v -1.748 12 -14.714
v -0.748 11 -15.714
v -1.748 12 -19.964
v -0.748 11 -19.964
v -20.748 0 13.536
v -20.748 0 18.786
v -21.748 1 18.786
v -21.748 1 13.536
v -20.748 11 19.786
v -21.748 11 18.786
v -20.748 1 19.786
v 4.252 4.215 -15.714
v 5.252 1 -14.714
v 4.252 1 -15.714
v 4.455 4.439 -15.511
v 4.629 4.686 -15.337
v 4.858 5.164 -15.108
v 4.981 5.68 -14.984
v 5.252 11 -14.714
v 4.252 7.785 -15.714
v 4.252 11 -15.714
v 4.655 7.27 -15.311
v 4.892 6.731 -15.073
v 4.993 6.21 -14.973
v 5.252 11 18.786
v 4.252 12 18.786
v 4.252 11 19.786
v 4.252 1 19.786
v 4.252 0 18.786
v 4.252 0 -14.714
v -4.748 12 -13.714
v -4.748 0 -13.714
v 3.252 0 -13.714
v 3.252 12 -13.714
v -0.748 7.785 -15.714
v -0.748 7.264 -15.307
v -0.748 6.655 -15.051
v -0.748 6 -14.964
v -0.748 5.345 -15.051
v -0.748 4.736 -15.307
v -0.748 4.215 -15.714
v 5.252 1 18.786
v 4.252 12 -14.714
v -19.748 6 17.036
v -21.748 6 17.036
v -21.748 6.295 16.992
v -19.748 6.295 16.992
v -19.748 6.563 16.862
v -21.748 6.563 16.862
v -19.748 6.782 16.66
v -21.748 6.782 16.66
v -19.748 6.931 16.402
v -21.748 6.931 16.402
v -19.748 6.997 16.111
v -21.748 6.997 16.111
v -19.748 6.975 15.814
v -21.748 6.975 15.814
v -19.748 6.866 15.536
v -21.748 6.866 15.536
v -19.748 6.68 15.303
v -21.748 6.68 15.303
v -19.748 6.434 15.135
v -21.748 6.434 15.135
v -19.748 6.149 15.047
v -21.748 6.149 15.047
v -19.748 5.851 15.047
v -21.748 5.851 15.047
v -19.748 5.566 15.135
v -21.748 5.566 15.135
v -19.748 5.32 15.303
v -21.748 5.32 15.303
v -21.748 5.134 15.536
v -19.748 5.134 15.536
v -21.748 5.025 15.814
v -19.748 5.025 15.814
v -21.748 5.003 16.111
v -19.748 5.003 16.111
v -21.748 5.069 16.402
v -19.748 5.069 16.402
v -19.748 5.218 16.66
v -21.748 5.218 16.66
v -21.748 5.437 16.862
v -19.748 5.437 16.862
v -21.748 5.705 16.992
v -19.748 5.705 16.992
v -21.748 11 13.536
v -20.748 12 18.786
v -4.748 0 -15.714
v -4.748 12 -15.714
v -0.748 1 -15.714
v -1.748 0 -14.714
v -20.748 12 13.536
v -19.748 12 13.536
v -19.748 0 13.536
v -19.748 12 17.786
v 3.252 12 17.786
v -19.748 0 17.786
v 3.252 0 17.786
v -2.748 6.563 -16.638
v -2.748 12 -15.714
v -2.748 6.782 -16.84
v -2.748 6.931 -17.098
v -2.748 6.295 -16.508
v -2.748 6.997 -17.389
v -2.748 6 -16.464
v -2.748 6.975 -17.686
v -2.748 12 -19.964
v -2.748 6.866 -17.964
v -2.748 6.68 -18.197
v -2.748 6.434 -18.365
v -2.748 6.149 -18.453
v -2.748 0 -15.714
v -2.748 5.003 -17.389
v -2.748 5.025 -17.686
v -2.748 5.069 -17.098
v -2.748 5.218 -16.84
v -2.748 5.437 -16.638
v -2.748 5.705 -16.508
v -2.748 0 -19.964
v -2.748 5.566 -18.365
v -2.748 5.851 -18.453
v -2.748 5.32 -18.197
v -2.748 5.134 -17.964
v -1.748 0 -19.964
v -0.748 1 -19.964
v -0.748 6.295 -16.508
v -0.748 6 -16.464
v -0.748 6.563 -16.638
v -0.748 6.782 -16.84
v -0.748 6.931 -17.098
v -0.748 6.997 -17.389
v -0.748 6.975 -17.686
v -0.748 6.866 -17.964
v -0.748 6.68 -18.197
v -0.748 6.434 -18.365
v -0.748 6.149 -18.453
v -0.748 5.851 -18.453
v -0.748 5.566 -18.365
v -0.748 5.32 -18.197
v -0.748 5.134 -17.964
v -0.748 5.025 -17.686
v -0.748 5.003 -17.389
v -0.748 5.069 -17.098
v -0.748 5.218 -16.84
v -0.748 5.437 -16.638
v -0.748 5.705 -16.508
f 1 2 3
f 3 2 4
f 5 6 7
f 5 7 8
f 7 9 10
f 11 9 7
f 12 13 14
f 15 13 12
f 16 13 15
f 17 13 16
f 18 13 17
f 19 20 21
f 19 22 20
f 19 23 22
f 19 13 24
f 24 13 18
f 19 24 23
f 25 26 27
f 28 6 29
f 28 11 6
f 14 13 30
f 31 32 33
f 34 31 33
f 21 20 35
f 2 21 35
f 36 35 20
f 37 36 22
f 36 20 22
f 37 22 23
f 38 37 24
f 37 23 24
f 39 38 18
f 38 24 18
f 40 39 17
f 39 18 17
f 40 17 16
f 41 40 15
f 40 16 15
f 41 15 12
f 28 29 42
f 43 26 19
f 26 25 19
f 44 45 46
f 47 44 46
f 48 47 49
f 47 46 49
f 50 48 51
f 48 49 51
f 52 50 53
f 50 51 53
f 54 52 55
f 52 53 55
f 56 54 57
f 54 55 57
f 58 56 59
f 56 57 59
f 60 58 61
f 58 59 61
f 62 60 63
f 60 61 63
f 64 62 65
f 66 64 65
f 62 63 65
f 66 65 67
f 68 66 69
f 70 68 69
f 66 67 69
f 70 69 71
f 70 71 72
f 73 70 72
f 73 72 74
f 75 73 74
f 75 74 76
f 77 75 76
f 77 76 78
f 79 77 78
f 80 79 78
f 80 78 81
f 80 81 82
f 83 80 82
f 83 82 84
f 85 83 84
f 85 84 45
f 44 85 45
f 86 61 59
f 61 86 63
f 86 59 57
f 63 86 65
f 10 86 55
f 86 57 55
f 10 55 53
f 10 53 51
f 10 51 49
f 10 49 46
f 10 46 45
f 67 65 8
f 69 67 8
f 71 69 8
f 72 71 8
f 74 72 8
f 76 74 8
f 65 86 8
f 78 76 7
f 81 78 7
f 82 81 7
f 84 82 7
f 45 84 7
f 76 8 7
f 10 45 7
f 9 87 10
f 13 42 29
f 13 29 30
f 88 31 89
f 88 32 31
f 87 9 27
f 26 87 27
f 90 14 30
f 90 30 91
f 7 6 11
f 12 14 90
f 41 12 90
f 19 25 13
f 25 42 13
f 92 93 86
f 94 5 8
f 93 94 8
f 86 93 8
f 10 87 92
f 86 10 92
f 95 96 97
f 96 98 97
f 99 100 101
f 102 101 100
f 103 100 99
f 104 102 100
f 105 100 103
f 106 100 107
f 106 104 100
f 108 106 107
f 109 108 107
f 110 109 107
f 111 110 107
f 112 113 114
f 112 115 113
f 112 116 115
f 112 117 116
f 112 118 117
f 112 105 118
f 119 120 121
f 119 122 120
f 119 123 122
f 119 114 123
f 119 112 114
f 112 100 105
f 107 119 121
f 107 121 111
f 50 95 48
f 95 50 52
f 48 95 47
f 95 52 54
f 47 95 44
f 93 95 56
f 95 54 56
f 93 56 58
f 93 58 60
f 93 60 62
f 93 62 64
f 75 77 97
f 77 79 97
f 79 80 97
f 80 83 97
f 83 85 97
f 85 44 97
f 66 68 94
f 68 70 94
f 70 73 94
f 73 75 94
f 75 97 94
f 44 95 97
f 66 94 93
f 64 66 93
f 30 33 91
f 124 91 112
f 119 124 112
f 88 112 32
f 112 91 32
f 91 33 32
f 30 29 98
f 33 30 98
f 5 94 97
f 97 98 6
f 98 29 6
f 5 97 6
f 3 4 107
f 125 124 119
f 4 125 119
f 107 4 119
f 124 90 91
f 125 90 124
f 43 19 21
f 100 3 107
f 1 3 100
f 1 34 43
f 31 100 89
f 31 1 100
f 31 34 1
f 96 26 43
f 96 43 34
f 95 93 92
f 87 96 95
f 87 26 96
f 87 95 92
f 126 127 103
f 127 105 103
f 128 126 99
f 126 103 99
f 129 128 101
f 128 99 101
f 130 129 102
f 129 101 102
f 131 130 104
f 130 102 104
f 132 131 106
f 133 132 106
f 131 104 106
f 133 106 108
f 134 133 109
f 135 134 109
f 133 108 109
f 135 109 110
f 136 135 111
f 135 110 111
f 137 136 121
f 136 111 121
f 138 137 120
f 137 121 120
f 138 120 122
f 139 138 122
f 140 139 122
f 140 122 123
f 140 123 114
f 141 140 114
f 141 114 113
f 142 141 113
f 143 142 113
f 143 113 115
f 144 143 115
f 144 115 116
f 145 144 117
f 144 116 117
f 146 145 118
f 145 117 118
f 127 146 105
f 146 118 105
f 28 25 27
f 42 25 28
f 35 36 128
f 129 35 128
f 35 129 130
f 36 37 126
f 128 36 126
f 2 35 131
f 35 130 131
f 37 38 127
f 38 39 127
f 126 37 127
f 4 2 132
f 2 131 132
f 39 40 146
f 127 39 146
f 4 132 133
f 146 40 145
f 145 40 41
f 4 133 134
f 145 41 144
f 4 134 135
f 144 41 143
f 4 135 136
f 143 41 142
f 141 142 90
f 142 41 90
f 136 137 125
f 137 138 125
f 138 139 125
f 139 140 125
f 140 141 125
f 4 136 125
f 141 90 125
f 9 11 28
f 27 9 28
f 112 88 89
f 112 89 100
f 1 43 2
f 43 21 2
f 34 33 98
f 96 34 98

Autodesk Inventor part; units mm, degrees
ref_plane "YZ Plane" through (0, 0, 0) normal (1, 0, 0) x (0, 1, 0)
ref_plane "XZ Plane" through (0, 0, 0) normal (0, 1, 0) x (-1, 0, 0)
ref_plane "XY Plane" through (0, 0, 0) normal (0, 0, 1) x (1, 0, 0)
sketch "Sketch1" plane through (0, 0, 0) normal (0, 1, 0) x (-1, 0, 0)
  line L0 (21.7482, 13.5362) -> (21.7482, 19.7862)
  line L1 (21.7482, 19.7862) -> (-5.2518, 19.7862)
  line L2 (-5.2518, 19.7862) -> (-5.2518, -15.7138)
  line L3 (-5.2518, -15.7138) -> (0.7482, -15.7138)
  line L4 (0.7482, -15.7138) -> (0.7482, -19.9638)
  line L5 (0.7482, -19.9638) -> (2.7482, -19.9638)
  line L6 (4.7482, -13.7138) -> (-3.2518, -13.7138)
  line L7 (-3.2518, -13.7138) -> (-3.2518, 17.7862)
  line L8 (-3.2518, 17.7862) -> (19.7482, 17.7862)
  line L9 (19.7482, 17.7862) -> (19.7482, 13.5362)
  line L10 (19.7482, 13.5362) -> (21.7482, 13.5362)
  line L11 (4.7482, -13.7138) -> (4.7482, -15.7138)
  line L12 (4.7482, -15.7138) -> (2.7482, -15.7138)
  line L13 (2.7482, -15.7138) -> (2.7482, -19.9638)
  point P0 (0, 0)
  dimension "d1" = 4.25
  dimension "d2" = 2
  dimension "d3" = 2
  dimension "d4" = 2
  dimension "d5" = 2
  dimension "d6" = 2
  dimension "d7" = 23
  dimension "d8" = 2
  dimension "d9" = 4.25
  dimension "d10" = 2
  dimension "d21" = 31.5
  dimension "d22" = 8
extrude "Extrusion1" add sketch "Sketch1" along normal blind 12
sketch "Sketch2" plane through (-21.7482, 0, 13.5362) normal (-1, 0, 0) x (0, 0, 1)
  circle A0 centre (2.5, 6) radius 1
  line L0 (6.25, 0) -> (6.25, 12) projected
  line L1 (0, 0) -> (0, 12) projected
  point P0 (-13.5362, 0)
  point P1 (6.25, 6)
  dimension "d13" = 1.5
  dimension "d14" = 2
extrude "Extrusion2" cut sketch "Sketch2" against normal up to surface (2 mm away)
sketch "Sketch3" plane through (-2.7482, 0, -19.9638) normal (-1, 0, 0) x (0, 0, 1)
  circle A0 centre (2.5, 6) radius 1
  line L0 (0, 0) -> (0, 12) projected
  point P0 (19.9638, 0)
  point P1 (0, 6)
  dimension "d17" = 1.5
  dimension "d18" = 2
extrude "Extrusion3" cut sketch "Sketch3" against normal up to surface (2 mm away)
chamfer "Chamfer1" distance 1 angle 45 13 edges at (5.2518, 0, 2.0362) (5.2518, 12, 2.0362) (-8.2482, 12, 19.7862) (-8.2482, 0, 19.7862) (-21.7482, 0, 16.6612) (-21.7482, 12, 16.6612) (-21.7482, 6, 19.7862) (5.2518, 6, -15.7138) (2.2518, 12, -15.7138) (2.2518, 0, -15.7138) (-0.7482, 12, -17.8388) (-0.7482, 0, -17.8388) (5.2518, 6, 19.7862)
sketch "Sketch4" plane through (5.2518, 1, -14.7138) normal (1, 0, 0) x (0, 0, -1)
  circle A0 centre (2.75, 5) radius 2.5
  circle A1 centre (2.75, 5) radius 1 projected
  point P0 (-14.7138, -1)
  dimension "d26" = 5
extrude "Extrusion4" cut sketch "Sketch4" against normal up to surface (6 mm away) contours A0 | A1
equation "\"d1\" = -0.5 * servo_A + 0.5 * servo_D"
equation "\"d7\" = servo_E + servo_F"
equation "\"d8\" = servo_F"
equation "\"d9\" = -0.5 * servo_A + 0.5 * servo_D"
equation "\"d21\" = servo_D"
equation "\"d11\" = servo_B"
equation "\"d13\" = servo_L"
equation "\"d14\" = servo_H"
equation "\"d15\" = servo_B"
equation "\"d17\" = servo_L"
equation "\"d18\" = servo_H"
equation "\"d19\" = servo_B"
equation "\"servo_A\" = 23"
equation "\"servo_D\" = 31.5"
equation "\"servo_E\" = 21"
equation "\"servo_F\" = 2"
equation "\"servo_B\" = 12"
equation "\"servo_L\" = 1.5"
equation "\"servo_H\" = 2"
properties part number "FEMUR2_B"
